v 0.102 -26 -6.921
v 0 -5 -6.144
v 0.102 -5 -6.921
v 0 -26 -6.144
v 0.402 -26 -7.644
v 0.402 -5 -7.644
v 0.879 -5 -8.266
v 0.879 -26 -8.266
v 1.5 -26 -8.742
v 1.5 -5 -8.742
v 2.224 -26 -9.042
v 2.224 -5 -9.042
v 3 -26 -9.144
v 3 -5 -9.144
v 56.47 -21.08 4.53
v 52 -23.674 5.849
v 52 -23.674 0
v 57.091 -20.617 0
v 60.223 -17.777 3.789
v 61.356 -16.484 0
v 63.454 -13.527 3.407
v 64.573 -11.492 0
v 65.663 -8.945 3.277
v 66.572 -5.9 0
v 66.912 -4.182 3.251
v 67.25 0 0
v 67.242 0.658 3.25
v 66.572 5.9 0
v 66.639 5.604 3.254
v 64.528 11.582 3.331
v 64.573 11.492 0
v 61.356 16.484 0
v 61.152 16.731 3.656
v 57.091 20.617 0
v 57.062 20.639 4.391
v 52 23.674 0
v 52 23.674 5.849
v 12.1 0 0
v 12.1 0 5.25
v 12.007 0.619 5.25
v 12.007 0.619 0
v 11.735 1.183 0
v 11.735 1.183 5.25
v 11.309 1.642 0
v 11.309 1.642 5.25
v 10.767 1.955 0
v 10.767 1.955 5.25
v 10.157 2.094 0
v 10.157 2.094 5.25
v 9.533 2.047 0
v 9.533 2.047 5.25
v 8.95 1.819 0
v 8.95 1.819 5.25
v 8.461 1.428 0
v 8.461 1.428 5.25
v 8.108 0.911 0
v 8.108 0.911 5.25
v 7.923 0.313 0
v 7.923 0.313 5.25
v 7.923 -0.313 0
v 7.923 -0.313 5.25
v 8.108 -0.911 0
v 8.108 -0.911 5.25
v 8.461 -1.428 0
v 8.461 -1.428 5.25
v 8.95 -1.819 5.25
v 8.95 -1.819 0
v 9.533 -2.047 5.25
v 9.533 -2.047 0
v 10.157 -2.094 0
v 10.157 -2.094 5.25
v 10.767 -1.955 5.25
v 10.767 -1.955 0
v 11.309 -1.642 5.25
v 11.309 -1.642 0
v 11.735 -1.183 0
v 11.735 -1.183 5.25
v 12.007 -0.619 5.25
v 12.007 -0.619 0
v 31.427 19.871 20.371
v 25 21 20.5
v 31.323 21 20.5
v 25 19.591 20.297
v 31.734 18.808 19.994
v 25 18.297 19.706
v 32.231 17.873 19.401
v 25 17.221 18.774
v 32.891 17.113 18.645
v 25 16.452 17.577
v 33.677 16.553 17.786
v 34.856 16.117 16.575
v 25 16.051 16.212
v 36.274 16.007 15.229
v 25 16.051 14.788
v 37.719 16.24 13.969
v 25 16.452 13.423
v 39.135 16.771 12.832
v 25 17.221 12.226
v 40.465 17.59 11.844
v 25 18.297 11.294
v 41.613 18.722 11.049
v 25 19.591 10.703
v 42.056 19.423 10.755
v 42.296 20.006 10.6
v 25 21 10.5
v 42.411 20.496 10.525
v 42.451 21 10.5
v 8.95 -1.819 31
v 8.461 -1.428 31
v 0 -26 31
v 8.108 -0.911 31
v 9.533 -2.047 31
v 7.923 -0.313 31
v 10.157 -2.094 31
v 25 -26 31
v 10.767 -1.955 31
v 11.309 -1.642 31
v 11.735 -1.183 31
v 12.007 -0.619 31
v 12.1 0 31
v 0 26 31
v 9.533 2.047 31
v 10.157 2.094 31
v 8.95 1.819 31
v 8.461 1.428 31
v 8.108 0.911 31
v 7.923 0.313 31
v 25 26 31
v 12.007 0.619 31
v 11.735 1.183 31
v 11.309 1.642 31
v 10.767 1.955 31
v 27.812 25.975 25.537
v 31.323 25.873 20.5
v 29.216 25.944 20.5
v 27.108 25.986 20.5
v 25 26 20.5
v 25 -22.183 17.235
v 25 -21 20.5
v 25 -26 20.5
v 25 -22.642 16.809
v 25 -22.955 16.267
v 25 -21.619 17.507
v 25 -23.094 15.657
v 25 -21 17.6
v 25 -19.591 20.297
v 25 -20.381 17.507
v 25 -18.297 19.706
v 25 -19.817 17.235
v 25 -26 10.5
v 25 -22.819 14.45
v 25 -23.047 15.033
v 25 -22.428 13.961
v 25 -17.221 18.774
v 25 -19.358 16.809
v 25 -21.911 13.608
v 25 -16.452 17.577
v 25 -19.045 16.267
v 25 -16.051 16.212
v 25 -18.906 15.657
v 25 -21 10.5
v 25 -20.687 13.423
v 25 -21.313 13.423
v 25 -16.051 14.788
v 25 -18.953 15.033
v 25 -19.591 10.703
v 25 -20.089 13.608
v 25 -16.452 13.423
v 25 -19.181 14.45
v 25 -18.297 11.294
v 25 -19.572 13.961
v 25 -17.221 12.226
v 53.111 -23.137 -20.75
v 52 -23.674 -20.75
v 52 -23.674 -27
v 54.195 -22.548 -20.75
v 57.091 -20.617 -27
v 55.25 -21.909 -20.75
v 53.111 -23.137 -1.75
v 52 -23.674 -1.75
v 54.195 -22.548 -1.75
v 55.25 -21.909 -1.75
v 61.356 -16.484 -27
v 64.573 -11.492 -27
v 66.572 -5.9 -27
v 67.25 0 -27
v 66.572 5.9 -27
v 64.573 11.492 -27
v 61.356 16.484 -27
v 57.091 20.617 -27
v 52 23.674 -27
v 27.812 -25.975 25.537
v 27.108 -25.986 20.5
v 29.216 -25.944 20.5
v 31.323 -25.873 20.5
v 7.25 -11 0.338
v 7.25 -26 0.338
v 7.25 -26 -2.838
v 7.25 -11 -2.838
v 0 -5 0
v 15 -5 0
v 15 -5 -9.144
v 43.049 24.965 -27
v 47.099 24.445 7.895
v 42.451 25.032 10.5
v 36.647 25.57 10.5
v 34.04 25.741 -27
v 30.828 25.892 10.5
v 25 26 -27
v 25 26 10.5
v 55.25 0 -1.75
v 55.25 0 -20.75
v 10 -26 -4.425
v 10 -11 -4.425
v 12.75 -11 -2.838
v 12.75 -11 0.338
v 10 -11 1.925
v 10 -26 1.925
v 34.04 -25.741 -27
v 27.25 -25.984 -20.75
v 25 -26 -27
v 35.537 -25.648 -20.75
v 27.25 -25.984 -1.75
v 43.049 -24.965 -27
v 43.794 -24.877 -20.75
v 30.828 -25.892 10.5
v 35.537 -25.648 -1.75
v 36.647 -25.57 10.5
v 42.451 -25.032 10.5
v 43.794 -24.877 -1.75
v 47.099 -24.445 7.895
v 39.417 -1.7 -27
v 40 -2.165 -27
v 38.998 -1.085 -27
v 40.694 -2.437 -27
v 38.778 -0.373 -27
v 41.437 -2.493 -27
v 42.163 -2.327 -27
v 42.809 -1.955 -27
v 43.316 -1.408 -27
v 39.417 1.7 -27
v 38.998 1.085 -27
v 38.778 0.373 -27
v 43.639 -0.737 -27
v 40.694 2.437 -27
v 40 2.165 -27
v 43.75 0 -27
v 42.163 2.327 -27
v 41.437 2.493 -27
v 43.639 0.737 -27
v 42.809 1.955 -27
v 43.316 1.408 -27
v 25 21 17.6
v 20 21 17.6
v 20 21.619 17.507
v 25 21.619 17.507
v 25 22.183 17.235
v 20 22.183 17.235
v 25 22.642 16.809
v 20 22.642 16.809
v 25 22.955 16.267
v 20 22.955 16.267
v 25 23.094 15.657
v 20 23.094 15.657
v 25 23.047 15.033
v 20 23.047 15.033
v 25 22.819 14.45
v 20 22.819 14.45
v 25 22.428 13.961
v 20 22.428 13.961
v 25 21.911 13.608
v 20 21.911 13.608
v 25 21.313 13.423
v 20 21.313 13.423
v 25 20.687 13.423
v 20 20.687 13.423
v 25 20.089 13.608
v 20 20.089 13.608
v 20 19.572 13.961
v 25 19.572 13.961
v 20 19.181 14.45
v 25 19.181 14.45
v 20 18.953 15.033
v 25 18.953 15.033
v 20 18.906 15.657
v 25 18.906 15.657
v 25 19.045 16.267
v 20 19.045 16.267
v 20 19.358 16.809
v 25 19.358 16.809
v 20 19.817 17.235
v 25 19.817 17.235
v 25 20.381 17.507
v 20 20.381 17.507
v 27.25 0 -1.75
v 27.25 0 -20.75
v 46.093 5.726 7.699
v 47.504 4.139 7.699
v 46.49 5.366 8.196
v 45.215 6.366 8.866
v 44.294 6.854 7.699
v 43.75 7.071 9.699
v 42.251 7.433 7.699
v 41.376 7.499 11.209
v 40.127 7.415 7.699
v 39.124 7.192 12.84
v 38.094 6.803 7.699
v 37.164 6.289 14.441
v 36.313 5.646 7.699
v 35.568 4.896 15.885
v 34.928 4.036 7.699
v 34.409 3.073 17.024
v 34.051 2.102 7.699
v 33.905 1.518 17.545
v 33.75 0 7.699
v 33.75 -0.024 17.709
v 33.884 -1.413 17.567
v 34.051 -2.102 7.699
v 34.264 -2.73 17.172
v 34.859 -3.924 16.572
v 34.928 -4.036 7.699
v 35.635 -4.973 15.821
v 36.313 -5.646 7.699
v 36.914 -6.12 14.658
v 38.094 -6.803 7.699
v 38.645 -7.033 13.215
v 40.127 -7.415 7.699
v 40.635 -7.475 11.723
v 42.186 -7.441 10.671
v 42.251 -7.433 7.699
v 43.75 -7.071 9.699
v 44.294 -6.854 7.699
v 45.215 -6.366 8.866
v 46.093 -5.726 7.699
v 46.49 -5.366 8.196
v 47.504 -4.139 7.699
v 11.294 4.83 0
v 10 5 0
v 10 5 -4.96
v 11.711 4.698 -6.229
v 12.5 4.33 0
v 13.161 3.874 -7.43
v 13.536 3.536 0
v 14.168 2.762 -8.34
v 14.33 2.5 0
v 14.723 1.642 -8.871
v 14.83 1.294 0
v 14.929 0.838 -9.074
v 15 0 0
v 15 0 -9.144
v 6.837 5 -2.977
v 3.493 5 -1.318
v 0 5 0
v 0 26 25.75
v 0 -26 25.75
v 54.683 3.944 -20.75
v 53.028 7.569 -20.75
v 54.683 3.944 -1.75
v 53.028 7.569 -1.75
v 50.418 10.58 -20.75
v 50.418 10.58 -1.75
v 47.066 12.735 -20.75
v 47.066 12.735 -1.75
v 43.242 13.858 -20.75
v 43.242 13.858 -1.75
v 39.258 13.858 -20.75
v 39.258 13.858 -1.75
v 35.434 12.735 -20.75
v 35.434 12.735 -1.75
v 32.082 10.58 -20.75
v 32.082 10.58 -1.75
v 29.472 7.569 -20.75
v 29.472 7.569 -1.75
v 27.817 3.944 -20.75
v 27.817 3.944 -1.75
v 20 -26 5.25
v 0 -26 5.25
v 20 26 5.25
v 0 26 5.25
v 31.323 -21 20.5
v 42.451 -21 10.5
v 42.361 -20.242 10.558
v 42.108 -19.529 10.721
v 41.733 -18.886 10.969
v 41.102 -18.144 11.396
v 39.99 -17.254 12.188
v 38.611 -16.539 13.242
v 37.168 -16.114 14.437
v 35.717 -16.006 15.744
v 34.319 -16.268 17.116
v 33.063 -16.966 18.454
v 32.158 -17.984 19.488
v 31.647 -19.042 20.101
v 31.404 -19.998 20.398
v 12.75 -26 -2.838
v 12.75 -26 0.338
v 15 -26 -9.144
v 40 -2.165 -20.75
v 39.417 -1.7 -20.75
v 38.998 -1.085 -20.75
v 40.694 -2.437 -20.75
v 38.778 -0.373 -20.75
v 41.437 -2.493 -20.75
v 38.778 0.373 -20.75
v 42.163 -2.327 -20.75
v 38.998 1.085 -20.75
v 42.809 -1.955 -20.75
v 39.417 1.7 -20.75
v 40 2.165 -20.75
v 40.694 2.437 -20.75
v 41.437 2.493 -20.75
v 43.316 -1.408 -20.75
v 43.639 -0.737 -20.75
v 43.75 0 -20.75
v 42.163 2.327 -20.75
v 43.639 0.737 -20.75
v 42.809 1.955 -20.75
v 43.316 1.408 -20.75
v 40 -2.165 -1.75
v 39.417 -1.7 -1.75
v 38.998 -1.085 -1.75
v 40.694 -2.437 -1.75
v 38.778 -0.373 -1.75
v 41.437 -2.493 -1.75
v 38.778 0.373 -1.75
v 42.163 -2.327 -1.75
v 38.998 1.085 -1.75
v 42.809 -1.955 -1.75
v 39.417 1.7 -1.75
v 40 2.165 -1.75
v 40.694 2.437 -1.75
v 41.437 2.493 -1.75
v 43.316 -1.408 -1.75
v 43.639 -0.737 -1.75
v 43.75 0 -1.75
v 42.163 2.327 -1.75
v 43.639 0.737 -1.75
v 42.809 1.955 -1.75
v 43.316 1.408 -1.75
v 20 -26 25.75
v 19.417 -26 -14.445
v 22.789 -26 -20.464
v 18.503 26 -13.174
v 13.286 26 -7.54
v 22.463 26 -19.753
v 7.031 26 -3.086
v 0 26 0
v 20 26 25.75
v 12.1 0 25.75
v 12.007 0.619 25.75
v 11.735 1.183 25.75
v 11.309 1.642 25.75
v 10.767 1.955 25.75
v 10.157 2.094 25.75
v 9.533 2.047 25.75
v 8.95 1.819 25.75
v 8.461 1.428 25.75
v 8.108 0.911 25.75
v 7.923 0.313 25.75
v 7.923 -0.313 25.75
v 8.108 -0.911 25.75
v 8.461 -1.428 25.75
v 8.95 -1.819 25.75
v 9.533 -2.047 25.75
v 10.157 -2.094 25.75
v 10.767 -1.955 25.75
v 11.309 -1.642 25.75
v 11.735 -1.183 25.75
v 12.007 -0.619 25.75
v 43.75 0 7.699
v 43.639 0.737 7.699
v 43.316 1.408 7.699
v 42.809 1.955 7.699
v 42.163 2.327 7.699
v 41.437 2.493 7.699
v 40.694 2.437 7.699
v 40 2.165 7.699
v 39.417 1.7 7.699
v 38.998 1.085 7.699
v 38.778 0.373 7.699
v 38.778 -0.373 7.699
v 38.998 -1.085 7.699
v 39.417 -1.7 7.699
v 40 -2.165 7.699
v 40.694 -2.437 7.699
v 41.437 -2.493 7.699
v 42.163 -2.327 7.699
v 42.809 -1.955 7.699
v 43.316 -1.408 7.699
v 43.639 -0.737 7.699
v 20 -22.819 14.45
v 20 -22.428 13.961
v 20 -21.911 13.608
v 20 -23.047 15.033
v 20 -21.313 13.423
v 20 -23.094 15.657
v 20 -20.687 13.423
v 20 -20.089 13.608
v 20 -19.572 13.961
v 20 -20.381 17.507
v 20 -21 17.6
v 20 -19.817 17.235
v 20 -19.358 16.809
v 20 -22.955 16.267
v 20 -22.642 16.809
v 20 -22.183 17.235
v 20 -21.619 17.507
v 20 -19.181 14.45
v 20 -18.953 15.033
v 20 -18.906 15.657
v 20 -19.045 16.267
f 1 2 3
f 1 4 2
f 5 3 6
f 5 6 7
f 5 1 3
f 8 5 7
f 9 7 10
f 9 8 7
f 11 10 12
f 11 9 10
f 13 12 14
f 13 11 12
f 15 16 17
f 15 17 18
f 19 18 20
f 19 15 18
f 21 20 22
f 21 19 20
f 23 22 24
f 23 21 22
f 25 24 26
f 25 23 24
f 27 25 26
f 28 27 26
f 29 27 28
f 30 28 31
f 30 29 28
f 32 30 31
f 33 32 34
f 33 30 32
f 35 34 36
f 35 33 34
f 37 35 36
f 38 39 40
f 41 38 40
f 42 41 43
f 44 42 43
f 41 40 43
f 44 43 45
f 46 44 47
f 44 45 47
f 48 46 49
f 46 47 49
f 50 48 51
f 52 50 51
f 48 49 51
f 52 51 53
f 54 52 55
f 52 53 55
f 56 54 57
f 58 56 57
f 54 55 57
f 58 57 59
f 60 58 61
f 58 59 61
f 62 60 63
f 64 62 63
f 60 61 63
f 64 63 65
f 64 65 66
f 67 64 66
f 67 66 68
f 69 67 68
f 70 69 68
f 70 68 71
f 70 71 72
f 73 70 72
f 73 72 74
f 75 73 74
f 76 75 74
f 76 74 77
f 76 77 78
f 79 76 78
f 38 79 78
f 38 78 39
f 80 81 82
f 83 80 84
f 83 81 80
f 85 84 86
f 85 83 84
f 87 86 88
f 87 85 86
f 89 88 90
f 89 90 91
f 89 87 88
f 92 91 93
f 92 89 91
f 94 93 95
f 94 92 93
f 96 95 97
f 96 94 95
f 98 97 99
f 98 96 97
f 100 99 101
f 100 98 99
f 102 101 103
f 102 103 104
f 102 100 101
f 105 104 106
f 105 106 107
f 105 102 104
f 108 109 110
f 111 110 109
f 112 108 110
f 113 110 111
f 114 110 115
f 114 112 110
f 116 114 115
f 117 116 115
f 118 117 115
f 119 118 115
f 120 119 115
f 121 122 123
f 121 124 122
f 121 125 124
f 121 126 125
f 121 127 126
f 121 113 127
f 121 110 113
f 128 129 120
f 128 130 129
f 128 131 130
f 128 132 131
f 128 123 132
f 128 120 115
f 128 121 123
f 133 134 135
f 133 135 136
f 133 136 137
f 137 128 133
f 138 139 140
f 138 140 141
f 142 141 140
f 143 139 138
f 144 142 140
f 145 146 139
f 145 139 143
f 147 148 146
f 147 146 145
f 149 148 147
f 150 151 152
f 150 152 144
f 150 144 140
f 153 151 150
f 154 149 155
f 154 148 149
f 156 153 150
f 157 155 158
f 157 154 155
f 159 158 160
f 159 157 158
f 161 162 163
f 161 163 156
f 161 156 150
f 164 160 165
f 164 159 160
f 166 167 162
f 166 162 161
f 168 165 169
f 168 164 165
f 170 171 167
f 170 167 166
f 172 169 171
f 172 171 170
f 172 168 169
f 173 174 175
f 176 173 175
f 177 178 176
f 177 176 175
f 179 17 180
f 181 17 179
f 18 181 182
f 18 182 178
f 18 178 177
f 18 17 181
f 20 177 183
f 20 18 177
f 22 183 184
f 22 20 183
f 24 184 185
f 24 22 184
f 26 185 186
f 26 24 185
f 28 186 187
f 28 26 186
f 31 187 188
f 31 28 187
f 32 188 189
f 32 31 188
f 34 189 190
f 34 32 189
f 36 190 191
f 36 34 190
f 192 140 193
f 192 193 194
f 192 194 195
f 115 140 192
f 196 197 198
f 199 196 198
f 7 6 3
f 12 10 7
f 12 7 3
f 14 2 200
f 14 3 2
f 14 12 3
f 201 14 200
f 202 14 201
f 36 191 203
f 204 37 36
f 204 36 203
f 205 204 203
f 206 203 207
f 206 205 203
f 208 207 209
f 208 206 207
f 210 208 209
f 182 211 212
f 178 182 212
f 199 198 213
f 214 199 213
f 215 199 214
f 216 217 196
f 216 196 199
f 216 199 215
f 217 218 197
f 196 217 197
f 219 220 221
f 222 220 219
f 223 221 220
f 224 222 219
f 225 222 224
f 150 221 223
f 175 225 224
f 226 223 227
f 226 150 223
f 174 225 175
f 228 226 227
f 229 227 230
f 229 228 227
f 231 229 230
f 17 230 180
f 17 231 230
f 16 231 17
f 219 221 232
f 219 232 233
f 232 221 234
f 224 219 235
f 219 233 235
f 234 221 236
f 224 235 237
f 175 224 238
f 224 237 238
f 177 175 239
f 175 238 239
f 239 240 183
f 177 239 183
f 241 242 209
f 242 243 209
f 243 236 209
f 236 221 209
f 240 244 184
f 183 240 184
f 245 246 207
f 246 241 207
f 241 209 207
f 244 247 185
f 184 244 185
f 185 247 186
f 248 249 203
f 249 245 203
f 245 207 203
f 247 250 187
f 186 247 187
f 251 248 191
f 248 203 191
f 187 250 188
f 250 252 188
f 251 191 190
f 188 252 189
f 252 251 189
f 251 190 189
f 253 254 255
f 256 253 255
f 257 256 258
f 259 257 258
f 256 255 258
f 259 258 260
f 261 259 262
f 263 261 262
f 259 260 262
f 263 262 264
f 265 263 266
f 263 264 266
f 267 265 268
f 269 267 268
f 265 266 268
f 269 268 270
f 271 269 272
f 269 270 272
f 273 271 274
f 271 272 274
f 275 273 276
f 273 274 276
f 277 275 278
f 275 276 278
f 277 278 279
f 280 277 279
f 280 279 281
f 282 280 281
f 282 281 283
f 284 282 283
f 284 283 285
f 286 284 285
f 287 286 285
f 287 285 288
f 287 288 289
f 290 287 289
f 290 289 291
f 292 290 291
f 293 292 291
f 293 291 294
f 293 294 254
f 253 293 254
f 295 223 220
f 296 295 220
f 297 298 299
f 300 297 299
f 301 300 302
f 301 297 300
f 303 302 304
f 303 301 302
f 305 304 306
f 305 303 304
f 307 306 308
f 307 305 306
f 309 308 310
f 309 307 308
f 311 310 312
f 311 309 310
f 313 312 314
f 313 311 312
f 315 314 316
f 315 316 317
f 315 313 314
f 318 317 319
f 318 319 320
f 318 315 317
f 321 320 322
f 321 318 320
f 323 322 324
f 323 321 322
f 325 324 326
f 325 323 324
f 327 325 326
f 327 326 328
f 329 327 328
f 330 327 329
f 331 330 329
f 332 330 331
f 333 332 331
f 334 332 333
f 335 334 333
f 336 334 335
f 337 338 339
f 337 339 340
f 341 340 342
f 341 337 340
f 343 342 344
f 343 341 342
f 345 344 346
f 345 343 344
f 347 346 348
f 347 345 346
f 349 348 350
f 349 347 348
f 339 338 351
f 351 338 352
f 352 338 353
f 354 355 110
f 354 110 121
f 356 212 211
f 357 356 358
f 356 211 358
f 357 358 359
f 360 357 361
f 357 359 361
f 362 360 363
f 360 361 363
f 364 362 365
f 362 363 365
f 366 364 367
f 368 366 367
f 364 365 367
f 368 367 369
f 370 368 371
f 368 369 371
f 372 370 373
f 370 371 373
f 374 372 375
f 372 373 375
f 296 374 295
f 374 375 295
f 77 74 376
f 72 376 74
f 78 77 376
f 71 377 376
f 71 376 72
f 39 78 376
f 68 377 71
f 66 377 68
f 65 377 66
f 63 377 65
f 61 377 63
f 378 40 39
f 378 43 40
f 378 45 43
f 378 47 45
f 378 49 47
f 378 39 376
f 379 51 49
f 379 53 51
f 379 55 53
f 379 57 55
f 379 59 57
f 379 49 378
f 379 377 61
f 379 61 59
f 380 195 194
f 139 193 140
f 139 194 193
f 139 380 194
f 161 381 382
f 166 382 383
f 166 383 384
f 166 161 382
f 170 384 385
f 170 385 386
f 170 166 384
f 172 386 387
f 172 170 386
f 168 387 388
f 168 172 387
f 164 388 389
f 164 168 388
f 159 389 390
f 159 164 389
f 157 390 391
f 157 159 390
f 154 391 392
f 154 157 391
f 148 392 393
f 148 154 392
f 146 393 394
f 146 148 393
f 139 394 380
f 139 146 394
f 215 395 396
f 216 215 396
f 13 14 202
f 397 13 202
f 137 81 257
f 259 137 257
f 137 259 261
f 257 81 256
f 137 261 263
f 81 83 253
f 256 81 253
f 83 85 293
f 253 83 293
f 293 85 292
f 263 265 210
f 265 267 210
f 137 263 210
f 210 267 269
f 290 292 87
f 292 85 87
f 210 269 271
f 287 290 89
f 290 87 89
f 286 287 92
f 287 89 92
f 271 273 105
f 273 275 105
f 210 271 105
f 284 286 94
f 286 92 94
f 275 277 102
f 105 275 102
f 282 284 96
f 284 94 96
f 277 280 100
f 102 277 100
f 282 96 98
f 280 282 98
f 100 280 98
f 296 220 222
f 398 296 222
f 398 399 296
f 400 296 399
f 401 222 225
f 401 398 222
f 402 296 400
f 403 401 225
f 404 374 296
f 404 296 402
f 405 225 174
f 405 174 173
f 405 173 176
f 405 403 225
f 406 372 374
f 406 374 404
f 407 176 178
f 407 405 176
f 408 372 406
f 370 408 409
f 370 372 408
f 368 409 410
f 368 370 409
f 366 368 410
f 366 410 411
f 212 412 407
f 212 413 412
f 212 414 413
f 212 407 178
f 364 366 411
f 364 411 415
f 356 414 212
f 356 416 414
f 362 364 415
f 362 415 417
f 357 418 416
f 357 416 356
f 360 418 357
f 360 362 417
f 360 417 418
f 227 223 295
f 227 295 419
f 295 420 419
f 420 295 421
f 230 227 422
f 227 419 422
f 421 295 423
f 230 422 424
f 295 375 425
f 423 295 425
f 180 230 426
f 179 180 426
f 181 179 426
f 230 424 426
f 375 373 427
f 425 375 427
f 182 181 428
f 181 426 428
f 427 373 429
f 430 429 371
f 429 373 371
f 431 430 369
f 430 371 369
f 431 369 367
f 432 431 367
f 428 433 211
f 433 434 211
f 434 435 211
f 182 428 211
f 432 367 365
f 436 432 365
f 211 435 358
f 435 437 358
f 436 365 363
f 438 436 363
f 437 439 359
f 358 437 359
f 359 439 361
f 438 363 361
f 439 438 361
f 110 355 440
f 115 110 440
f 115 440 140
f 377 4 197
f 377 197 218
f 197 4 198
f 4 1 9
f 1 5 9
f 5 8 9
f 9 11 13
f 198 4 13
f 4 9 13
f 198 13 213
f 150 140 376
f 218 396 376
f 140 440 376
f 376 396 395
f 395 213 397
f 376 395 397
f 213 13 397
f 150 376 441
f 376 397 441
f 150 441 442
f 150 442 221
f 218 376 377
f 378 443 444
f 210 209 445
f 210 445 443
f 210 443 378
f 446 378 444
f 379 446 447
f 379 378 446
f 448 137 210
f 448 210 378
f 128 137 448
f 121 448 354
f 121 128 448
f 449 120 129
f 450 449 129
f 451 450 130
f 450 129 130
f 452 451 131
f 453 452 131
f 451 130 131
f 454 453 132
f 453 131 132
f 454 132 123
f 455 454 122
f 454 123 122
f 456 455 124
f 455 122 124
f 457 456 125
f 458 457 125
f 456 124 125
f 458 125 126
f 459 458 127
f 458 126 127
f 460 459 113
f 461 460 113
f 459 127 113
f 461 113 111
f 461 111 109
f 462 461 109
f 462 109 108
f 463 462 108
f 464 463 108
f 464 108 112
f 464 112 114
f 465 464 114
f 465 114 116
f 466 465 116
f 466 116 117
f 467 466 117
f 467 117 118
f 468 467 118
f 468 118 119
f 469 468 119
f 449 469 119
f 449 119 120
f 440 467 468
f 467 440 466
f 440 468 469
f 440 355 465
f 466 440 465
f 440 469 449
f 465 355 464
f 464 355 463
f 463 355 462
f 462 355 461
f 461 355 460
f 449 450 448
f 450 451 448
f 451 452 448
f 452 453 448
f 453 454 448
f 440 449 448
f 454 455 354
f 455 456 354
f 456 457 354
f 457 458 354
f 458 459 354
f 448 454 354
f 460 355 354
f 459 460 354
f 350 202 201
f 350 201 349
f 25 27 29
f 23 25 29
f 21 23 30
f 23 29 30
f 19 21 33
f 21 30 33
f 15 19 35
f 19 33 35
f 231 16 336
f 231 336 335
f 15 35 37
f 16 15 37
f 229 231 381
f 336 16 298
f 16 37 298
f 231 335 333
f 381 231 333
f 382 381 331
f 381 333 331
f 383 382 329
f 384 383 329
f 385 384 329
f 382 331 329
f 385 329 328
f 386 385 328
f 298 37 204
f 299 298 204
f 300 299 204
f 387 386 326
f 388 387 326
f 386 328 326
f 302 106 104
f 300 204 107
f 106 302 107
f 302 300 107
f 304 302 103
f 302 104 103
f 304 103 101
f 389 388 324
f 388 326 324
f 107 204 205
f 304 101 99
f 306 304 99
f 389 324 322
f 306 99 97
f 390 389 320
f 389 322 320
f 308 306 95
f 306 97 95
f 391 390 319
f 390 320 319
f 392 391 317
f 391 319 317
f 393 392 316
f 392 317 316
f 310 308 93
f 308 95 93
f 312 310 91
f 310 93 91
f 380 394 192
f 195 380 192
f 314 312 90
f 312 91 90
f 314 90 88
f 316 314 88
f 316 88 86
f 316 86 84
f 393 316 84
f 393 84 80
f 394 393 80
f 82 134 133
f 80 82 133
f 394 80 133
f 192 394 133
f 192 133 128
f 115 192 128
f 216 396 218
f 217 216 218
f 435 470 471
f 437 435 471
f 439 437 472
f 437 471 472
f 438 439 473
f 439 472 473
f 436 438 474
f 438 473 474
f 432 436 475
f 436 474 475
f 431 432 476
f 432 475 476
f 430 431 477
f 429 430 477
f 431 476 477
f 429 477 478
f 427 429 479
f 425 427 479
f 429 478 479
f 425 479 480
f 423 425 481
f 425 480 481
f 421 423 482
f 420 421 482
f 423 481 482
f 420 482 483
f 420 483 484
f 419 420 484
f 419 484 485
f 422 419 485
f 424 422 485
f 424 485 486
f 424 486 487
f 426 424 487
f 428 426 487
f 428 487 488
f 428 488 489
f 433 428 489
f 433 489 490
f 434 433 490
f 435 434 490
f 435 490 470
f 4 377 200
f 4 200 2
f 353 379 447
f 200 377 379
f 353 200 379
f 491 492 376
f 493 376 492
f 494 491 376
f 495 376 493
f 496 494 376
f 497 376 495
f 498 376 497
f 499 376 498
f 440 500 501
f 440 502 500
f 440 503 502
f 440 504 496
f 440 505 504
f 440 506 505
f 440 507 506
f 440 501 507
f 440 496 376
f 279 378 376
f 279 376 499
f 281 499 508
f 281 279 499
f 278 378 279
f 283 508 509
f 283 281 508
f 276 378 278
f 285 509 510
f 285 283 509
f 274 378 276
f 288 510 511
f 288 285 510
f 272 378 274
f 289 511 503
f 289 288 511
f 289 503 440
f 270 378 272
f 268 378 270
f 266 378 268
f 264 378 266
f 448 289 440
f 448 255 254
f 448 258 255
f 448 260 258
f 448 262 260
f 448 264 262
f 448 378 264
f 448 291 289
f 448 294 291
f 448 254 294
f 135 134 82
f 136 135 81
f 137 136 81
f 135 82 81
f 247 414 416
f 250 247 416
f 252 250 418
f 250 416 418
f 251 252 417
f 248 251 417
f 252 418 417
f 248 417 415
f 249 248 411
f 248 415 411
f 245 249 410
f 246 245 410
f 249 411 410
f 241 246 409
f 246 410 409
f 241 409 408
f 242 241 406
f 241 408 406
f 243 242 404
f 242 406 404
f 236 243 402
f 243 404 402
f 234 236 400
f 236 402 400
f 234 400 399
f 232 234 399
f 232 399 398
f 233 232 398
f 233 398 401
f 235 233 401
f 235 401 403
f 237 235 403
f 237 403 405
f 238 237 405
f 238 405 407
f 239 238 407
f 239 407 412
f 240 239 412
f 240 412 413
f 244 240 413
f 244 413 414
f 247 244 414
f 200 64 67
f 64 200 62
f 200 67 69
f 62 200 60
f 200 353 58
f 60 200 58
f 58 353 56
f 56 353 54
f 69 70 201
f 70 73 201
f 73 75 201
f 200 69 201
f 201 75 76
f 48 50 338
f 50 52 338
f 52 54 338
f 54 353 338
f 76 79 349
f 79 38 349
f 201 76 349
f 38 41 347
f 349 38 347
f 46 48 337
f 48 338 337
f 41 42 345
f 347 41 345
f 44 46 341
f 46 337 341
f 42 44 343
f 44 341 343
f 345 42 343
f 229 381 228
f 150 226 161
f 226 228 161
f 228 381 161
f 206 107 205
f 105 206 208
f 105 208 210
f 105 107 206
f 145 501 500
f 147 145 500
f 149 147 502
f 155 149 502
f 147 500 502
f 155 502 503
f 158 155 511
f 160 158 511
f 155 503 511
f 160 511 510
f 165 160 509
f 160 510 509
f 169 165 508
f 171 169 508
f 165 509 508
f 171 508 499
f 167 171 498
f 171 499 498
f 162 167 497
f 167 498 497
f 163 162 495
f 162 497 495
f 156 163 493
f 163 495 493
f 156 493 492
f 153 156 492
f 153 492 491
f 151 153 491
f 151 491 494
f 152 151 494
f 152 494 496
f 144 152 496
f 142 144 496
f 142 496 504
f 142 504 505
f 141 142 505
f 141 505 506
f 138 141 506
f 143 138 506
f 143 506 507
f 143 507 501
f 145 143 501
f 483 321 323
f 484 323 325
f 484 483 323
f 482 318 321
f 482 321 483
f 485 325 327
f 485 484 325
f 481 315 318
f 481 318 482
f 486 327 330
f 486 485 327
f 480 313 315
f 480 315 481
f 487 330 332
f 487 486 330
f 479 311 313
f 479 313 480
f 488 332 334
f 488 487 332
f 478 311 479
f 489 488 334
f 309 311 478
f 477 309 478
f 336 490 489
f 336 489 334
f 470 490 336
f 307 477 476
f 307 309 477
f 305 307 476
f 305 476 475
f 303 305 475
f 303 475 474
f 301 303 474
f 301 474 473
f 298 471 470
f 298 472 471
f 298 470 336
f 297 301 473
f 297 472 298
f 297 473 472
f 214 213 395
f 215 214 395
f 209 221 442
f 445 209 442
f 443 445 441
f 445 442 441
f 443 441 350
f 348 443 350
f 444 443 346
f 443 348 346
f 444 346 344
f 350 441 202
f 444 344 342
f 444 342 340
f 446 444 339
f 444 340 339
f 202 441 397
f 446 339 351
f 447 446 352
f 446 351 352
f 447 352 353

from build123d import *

# Parameters (mm, degrees)
SKETCH_1_W              = 52
SKETCH_1_H              = 52
EXTRUDE_1_DEPTH         = 31
SKETCH_2_W              = 20.5
SKETCH_2_H              = 52
CUT_EXTRUDE_1_DEPTH     = 20
SKETCH_5_R              = 26
EXTRUDE_2_DEPTH         = 31
CUT_EXTRUDE_2_DEPTH     = 32
SKETCH_7_W              = 20
SKETCH_7_H              = 20.5
CUT_EXTRUDE_3_DEPTH     = 53
EXTRUDE_3_DEPTH         = 27
SKETCH_10_W             = 19
SKETCH_10_H             = 14
SKETCH_11_W             = 19
SKETCH_11_H             = 28
CUT_EXTRUDE_4_DEPTH     = 27
EXTRUDE_4_DEPTH         = 52
SKETCH_13_R             = 2.1
CUT_EXTRUDE_5_DEPTH     = 59
SKETCH_14_R             = 2.1
CUT_EXTRUDE_6_DEPTH     = 48.25
SKETCH_15_R             = 5
CUT_EXTRUDE_7_DEPTH     = 43.2500001
SKETCH_17_W             = 10
SKETCH_17_H             = 42.25
CUT_EXTRUDE_8_DEPTH     = 6.0000001
SKETCH_18_R             = 5
CUT_EXTRUDE_9_DEPTH     = 28.0000001
SKETCH_19_R             = 2.5
CUT_EXTRUDE_10_DEPTH    = 59.0000001
CUT_EXTRUDE1_DEPTH      = 53.0000001
SKETCH3_R               = 7.5
CUT_EXTRUDE2_DEPTH      = 22.300523217
CUT_EXTRUDE2_DEPTH_BACK = 2
CUT_EXTRUDE_11_DEPTH    = 28.0000001
SKETCH_21_W             = 15
SKETCH_21_H             = 9.144379334
EXTRUDE_5_DEPTH         = 21
CUT_EXTRUDE_12_DEPTH    = 15
FILLET_1_R              = 3


with BuildPart() as part:
    # Эскиз1 → Бобышка-Вытянуть1 (new body)
    with BuildSketch(Plane.XY):
        with Locations((26, 0)):
            Rectangle(SKETCH_1_W, SKETCH_1_H)
    extrude(amount=EXTRUDE_1_DEPTH)

    # Эскиз2 → Вырез-Вытянуть1 (cut)
    with BuildSketch(Plane.ZY):
        with Locations((15.5, 0)):
            Rectangle(SKETCH_2_W, SKETCH_2_H)
    extrude(amount=-CUT_EXTRUDE_1_DEPTH, mode=Mode.SUBTRACT)

    # Эскиз5 → Бобышка-Вытянуть2 (add)
    with BuildSketch(Plane.XY.offset(31)):
        with Locations((41.25, 0)):
            Circle(SKETCH_5_R)
    extrude(amount=-EXTRUDE_2_DEPTH)

    # Эскиз6 → Вырез-Вытянуть2 (cut, through all)
    with BuildSketch(Plane.XY.offset(31)):
        with BuildLine():
            Line((52, 23.673561202), (52, 26))
            Line((52, 26), (25, 26))
            ThreePointArc((25, 26), (38.550021379, 25.417314778), (52, 23.673561202))
        make_face()
    cut_extrude_2 = extrude(amount=-CUT_EXTRUDE_2_DEPTH, mode=Mode.SUBTRACT)

    # Зеркальное отражение1: Вырез-Вытянуть2 across plane
    add(cut_extrude_2.mirror(Plane(origin=(0, 0, 0), x_dir=(0, 0, 1), z_dir=(0, -1, 0))), mode=Mode.SUBTRACT)

    # Эскиз7 → Вырез-Вытянуть3 (cut, through all)
    with BuildSketch(Plane(origin=(0, 26, 0), x_dir=(1, 0, 0), z_dir=(0, 1, 0))):
        with Locations((10, -15.5)):
            Rectangle(SKETCH_7_W, SKETCH_7_H)
    extrude(amount=-CUT_EXTRUDE_3_DEPTH, mode=Mode.SUBTRACT)

    # Эскиз9 → Бобышка-Вытянуть3 (add)
    with BuildSketch(Plane(origin=(0, 0, 0), x_dir=(-1, 0, 0), z_dir=(0, 0, -1))):
        with BuildLine():
            Line((-25, 26), (-25, -26))
            ThreePointArc((-25, -26), (-38.550021379, -25.417314778), (-52, -23.673561202))
            ThreePointArc((-52, -23.673561202), (-67.25, 0), (-52, 23.673561202))
            ThreePointArc((-52, 23.673561202), (-38.550021379, 25.417314778), (-25, 26))
        make_face()
    extrude(amount=EXTRUDE_3_DEPTH)

    # Эскиз10 → Вырез-Повернуть2 (revolve, cut)
    with BuildSketch(Plane.ZY.offset(-41.25)):
        with Locations((-11.25, 7)):
            Rectangle(SKETCH_10_W, SKETCH_10_H)
    revolve(axis=Axis((41.25, 0, -20.75), (0, 0, 1)), mode=Mode.SUBTRACT)

    # Эскиз11 → Вырез-Вытянуть4 (cut, through all)
    with BuildSketch(Plane(origin=(0, 0, 0), x_dir=(0, 0, -1), z_dir=(0, -1, 0))):
        with Locations((11.25, 41.25)):
            Rectangle(SKETCH_11_W, SKETCH_11_H)
    extrude(amount=CUT_EXTRUDE_4_DEPTH, mode=Mode.SUBTRACT)

    # Эскиз12 → Бобышка-Вытянуть4 (add)
    with BuildSketch(Plane.XZ.offset(26)):
        with BuildLine():
            Line((0, 0), (25, 0))
            Line((25, 0), (25, -27))
            ThreePointArc((25, -27), (16.039335617, -10.222837391), (0, 0))
        make_face()
    extrude(amount=-EXTRUDE_4_DEPTH)

    # Эскиз13 → Вырез-Вытянуть5 (cut, through all)
    with BuildSketch(Plane.XY.offset(31)):
        with Locations((10, 0)):
            Circle(SKETCH_13_R)
    extrude(amount=-CUT_EXTRUDE_5_DEPTH, mode=Mode.SUBTRACT)

    # Эскиз14 → Вырез-Вытянуть6 (cut, through all)
    with BuildSketch(Plane.ZY.offset(-20)):
        with Locations((15.5, -21)):
            Circle(SKETCH_14_R)
        with Locations((15.5, 21)):
            Circle(SKETCH_14_R)
    extrude(amount=-CUT_EXTRUDE_6_DEPTH, mode=Mode.SUBTRACT)

    # Эскиз15 → Вырез-Вытянуть7 (cut, through all)
    with BuildSketch(Plane(origin=(25, 0, 0), x_dir=(0, 0, -1), z_dir=(1, 0, 0))):
        with Locations((-15.5, 21)):
            Circle(SKETCH_15_R)
        with Locations((-15.5, -21)):
            Circle(SKETCH_15_R)
    extrude(amount=CUT_EXTRUDE_7_DEPTH, mode=Mode.SUBTRACT)

    # Эскиз17 → Вырез-Вытянуть8 (cut, through all)
    with BuildSketch(Plane(origin=(0, 21, 0), x_dir=(0, 0, -1), z_dir=(0, 1, 0))):
        with Locations((-15.5, -46.125)):
            Rectangle(SKETCH_17_W, SKETCH_17_H)
    cut_extrude_8 = extrude(amount=CUT_EXTRUDE_8_DEPTH, mode=Mode.SUBTRACT)

    # Зеркальное отражение2: Вырез-Вытянуть8 across plane
    add(cut_extrude_8.mirror(Plane(origin=(0, 0, 0), x_dir=(0, 0, 1), z_dir=(0, -1, 0))), mode=Mode.SUBTRACT)

    # Эскиз18 → Вырез-Вытянуть9 (cut, through all)
    with BuildSketch(Plane(origin=(0, 0, 0), x_dir=(-1, 0, 0), z_dir=(0, 0, -1))):
        with Locations((-10, 0)):
            Circle(SKETCH_18_R)
    extrude(amount=CUT_EXTRUDE_9_DEPTH, mode=Mode.SUBTRACT)

    # Эскиз19 → Вырез-Вытянуть10 (cut, through all)
    with BuildSketch(Plane.XY.offset(31)):
        with Locations((41.25, 0)):
            Circle(SKETCH_19_R)
    extrude(amount=-CUT_EXTRUDE_10_DEPTH, mode=Mode.SUBTRACT)

    # Sketch1 → Cut-Extrude1 (cut, through all)
    with BuildSketch(Plane(origin=(0, 26, 0), x_dir=(1, 0, 0), z_dir=(0, 1, 0))):
        with BuildLine():
            Line((25, -31), (67.25, -31))
            Line((67.25, -31), (67.25, -3.25))
            ThreePointArc((67.25, -3.25), (41.975877859, -10.807868092), (25, -31))
        make_face()
    extrude(amount=-CUT_EXTRUDE1_DEPTH, mode=Mode.SUBTRACT)

    # Sketch3 → Cut-Extrude2 (cut, two sides)
    with BuildSketch(Plane.XY.offset(9.699476883)) as cut_extrude2_sk:
        with Locations((41.25, 0)):
            Circle(SKETCH3_R)
    extrude(amount=CUT_EXTRUDE2_DEPTH, mode=Mode.SUBTRACT)
    extrude(cut_extrude2_sk.sketch, amount=-CUT_EXTRUDE2_DEPTH_BACK, mode=Mode.SUBTRACT)

    # Эскиз20 → Вырез-Вытянуть11 (cut, through all)
    with BuildSketch(Plane(origin=(0, 0, 0), x_dir=(-1, 0, 0), z_dir=(0, 0, -1))):
        with BuildLine():
            Line((-10, 5), (0, 5))
            Line((0, 5), (0, -5))
            Line((0, -5), (-15, -5))
            Line((-15, -5), (-15, 0))
            ThreePointArc((-15, 0), (-13.535533906, 3.535533906), (-10, 5))
        make_face()
    extrude(amount=CUT_EXTRUDE_11_DEPTH, mode=Mode.SUBTRACT)

    # Эскиз21 → Бобышка-Вытянуть5 (add)
    with BuildSketch(Plane(origin=(0, -5, 0), x_dir=(1, 0, 0), z_dir=(0, 1, 0))):
        with Locations((7.5, 4.572189667)):
            Rectangle(SKETCH_21_W, SKETCH_21_H)
    extrude(amount=-EXTRUDE_5_DEPTH)

    # Эскиз22 → Вырез-Вытянуть12 (cut)
    with BuildSketch(Plane.XZ.offset(26)):
        Polygon((10, 1.925426481), (7.25, 0.33771324), (7.25, -2.83771324), (10, -4.425426481), (12.75, -2.83771324), (12.75, 0.33771324), align=None)
    extrude(amount=-CUT_EXTRUDE_12_DEPTH, mode=Mode.SUBTRACT)

    # Скругление1
    fillet_1_edges = [part.edges().sort_by_distance(p)[0] for p in [
        (0, -15.5, -9.144379334),
    ]]
    fillet(fillet_1_edges, radius=FILLET_1_R)


solid = part.part
